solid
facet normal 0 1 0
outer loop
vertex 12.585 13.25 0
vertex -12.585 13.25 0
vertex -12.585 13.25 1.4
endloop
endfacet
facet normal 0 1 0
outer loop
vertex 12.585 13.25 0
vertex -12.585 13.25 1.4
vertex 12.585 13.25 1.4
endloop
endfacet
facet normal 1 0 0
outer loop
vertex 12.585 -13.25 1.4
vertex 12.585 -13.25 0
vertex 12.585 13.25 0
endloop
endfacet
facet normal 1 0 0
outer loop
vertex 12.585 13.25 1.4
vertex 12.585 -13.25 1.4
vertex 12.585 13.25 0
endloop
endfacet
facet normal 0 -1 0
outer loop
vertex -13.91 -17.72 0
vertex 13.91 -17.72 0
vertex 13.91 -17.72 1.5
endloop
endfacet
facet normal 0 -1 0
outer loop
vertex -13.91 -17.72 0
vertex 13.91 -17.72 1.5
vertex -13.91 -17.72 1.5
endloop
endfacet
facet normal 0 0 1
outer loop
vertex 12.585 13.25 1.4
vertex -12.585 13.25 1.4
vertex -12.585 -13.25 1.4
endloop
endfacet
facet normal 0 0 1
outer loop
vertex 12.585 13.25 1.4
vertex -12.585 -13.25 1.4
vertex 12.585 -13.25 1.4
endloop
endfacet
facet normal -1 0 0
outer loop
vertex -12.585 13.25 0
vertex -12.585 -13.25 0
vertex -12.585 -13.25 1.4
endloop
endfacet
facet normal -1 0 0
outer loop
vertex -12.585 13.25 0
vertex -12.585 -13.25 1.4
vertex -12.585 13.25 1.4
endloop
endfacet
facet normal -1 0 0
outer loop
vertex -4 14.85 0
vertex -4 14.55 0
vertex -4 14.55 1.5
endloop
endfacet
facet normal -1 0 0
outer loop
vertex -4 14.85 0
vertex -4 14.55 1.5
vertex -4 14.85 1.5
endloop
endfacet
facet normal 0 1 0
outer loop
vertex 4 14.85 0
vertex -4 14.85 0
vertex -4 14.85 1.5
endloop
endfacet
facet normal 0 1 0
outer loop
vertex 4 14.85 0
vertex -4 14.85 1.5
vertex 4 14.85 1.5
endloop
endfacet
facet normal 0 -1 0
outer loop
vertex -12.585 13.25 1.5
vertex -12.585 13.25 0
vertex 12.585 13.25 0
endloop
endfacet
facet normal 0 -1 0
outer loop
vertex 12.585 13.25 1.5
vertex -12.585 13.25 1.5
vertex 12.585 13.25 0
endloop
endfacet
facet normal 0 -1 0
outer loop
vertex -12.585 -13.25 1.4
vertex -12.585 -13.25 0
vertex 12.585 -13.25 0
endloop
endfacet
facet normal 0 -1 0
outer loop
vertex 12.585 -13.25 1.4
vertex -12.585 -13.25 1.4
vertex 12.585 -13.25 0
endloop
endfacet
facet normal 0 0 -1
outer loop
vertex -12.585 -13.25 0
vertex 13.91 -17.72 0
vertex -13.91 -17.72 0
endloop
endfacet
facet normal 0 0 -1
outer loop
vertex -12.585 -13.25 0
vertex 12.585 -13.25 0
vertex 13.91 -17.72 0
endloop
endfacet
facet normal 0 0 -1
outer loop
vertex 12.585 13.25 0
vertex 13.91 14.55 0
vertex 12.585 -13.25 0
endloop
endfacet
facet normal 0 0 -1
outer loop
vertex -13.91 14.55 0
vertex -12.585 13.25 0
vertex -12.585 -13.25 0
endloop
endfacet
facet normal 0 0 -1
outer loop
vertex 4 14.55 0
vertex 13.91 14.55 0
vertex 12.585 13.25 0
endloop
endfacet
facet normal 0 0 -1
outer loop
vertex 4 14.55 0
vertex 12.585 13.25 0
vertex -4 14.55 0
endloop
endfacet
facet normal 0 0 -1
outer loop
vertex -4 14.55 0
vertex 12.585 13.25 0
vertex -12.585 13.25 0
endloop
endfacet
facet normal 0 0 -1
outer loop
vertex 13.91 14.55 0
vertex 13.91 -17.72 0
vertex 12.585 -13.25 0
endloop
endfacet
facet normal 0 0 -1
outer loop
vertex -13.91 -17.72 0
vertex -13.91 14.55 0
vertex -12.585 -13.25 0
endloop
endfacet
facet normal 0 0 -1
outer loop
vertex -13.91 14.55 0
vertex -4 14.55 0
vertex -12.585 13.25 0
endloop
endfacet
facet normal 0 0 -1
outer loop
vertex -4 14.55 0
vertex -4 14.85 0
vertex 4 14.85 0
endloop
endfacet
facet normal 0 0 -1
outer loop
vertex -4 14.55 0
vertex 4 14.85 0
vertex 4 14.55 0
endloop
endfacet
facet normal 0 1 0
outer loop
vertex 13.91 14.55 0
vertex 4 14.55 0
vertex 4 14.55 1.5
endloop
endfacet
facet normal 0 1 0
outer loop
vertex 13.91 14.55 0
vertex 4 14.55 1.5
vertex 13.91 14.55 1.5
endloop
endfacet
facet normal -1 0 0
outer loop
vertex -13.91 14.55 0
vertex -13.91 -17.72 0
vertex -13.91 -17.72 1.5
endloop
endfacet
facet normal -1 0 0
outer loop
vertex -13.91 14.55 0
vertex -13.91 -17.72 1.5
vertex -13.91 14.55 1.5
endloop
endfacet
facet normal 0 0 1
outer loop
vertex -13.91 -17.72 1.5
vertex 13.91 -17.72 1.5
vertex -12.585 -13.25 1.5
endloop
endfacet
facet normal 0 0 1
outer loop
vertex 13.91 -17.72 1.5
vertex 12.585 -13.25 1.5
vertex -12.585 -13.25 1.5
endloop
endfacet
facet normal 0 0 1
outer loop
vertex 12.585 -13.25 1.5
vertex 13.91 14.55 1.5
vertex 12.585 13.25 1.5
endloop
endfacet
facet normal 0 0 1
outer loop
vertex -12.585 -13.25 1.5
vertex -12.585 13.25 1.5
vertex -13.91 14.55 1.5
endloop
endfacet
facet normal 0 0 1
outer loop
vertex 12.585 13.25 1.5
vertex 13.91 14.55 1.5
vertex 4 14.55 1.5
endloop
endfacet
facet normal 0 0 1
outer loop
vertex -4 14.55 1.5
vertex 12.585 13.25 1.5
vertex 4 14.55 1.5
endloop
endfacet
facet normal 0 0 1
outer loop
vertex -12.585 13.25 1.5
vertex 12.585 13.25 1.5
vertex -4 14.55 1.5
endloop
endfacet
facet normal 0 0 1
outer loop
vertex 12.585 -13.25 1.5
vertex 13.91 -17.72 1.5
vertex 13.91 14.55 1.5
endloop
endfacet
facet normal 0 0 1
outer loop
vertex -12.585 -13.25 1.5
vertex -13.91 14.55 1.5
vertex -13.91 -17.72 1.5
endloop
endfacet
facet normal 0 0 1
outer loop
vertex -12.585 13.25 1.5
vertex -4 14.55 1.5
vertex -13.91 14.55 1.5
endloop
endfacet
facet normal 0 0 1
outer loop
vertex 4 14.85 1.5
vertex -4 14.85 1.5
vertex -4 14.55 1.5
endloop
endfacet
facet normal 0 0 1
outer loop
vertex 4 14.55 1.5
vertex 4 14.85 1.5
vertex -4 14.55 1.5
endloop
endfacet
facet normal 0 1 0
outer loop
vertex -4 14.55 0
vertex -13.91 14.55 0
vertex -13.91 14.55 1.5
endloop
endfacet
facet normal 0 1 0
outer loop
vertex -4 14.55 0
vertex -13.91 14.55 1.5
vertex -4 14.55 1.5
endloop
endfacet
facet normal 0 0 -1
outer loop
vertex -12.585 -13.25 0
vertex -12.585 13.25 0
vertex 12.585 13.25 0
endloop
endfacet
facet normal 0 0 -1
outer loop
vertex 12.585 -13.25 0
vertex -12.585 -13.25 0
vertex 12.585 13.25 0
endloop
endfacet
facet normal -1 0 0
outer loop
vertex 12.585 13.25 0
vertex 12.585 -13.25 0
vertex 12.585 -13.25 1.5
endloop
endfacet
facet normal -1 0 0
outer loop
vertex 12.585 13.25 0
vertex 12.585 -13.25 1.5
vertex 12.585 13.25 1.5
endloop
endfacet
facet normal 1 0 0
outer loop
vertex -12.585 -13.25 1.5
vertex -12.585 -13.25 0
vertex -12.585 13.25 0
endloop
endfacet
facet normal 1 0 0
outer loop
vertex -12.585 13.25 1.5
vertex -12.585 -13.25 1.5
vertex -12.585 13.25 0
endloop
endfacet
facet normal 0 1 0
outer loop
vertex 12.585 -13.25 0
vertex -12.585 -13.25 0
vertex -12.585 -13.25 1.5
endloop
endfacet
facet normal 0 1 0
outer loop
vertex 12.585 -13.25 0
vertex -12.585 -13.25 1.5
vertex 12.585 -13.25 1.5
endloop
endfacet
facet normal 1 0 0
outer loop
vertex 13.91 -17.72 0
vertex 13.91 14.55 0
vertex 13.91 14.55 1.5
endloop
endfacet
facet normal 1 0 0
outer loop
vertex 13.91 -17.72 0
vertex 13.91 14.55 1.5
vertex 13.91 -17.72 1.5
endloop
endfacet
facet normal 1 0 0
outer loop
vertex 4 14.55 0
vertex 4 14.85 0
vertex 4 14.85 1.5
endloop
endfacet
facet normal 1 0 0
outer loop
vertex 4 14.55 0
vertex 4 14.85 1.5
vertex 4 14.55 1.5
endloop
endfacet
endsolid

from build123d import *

# Parameters (mm, degrees)
SKETCH1_W           = 25.17
SKETCH1_H           = 26.5
BOSS_EXTRUDE3_DEPTH = 1.5
SKETCH1_4_W         = 25.17
SKETCH1_4_H         = 26.5
BOSS_EXTRUDE4_DEPTH = 1.4


with BuildPart() as part:
    # Sketch1 → Boss-Extrude3 (new body)
    with BuildSketch(Plane.XY):
        Polygon((4, 14.55), (13.91, 14.55), (13.91, -17.72), (-13.91, -17.72), (-13.91, 14.55), (-4, 14.55), (-4, 14.85), (4, 14.85), align=None)
        Rectangle(SKETCH1_W, SKETCH1_H, mode=Mode.SUBTRACT)
    extrude(amount=BOSS_EXTRUDE3_DEPTH)


with BuildPart() as body_2:
    # Sketch1<4> → Boss-Extrude4 (new body)
    with BuildSketch(Plane.XY):
        Rectangle(SKETCH1_4_W, SKETCH1_4_H)
    extrude(amount=BOSS_EXTRUDE4_DEPTH)


solid = Compound([part.part, body_2.part])
